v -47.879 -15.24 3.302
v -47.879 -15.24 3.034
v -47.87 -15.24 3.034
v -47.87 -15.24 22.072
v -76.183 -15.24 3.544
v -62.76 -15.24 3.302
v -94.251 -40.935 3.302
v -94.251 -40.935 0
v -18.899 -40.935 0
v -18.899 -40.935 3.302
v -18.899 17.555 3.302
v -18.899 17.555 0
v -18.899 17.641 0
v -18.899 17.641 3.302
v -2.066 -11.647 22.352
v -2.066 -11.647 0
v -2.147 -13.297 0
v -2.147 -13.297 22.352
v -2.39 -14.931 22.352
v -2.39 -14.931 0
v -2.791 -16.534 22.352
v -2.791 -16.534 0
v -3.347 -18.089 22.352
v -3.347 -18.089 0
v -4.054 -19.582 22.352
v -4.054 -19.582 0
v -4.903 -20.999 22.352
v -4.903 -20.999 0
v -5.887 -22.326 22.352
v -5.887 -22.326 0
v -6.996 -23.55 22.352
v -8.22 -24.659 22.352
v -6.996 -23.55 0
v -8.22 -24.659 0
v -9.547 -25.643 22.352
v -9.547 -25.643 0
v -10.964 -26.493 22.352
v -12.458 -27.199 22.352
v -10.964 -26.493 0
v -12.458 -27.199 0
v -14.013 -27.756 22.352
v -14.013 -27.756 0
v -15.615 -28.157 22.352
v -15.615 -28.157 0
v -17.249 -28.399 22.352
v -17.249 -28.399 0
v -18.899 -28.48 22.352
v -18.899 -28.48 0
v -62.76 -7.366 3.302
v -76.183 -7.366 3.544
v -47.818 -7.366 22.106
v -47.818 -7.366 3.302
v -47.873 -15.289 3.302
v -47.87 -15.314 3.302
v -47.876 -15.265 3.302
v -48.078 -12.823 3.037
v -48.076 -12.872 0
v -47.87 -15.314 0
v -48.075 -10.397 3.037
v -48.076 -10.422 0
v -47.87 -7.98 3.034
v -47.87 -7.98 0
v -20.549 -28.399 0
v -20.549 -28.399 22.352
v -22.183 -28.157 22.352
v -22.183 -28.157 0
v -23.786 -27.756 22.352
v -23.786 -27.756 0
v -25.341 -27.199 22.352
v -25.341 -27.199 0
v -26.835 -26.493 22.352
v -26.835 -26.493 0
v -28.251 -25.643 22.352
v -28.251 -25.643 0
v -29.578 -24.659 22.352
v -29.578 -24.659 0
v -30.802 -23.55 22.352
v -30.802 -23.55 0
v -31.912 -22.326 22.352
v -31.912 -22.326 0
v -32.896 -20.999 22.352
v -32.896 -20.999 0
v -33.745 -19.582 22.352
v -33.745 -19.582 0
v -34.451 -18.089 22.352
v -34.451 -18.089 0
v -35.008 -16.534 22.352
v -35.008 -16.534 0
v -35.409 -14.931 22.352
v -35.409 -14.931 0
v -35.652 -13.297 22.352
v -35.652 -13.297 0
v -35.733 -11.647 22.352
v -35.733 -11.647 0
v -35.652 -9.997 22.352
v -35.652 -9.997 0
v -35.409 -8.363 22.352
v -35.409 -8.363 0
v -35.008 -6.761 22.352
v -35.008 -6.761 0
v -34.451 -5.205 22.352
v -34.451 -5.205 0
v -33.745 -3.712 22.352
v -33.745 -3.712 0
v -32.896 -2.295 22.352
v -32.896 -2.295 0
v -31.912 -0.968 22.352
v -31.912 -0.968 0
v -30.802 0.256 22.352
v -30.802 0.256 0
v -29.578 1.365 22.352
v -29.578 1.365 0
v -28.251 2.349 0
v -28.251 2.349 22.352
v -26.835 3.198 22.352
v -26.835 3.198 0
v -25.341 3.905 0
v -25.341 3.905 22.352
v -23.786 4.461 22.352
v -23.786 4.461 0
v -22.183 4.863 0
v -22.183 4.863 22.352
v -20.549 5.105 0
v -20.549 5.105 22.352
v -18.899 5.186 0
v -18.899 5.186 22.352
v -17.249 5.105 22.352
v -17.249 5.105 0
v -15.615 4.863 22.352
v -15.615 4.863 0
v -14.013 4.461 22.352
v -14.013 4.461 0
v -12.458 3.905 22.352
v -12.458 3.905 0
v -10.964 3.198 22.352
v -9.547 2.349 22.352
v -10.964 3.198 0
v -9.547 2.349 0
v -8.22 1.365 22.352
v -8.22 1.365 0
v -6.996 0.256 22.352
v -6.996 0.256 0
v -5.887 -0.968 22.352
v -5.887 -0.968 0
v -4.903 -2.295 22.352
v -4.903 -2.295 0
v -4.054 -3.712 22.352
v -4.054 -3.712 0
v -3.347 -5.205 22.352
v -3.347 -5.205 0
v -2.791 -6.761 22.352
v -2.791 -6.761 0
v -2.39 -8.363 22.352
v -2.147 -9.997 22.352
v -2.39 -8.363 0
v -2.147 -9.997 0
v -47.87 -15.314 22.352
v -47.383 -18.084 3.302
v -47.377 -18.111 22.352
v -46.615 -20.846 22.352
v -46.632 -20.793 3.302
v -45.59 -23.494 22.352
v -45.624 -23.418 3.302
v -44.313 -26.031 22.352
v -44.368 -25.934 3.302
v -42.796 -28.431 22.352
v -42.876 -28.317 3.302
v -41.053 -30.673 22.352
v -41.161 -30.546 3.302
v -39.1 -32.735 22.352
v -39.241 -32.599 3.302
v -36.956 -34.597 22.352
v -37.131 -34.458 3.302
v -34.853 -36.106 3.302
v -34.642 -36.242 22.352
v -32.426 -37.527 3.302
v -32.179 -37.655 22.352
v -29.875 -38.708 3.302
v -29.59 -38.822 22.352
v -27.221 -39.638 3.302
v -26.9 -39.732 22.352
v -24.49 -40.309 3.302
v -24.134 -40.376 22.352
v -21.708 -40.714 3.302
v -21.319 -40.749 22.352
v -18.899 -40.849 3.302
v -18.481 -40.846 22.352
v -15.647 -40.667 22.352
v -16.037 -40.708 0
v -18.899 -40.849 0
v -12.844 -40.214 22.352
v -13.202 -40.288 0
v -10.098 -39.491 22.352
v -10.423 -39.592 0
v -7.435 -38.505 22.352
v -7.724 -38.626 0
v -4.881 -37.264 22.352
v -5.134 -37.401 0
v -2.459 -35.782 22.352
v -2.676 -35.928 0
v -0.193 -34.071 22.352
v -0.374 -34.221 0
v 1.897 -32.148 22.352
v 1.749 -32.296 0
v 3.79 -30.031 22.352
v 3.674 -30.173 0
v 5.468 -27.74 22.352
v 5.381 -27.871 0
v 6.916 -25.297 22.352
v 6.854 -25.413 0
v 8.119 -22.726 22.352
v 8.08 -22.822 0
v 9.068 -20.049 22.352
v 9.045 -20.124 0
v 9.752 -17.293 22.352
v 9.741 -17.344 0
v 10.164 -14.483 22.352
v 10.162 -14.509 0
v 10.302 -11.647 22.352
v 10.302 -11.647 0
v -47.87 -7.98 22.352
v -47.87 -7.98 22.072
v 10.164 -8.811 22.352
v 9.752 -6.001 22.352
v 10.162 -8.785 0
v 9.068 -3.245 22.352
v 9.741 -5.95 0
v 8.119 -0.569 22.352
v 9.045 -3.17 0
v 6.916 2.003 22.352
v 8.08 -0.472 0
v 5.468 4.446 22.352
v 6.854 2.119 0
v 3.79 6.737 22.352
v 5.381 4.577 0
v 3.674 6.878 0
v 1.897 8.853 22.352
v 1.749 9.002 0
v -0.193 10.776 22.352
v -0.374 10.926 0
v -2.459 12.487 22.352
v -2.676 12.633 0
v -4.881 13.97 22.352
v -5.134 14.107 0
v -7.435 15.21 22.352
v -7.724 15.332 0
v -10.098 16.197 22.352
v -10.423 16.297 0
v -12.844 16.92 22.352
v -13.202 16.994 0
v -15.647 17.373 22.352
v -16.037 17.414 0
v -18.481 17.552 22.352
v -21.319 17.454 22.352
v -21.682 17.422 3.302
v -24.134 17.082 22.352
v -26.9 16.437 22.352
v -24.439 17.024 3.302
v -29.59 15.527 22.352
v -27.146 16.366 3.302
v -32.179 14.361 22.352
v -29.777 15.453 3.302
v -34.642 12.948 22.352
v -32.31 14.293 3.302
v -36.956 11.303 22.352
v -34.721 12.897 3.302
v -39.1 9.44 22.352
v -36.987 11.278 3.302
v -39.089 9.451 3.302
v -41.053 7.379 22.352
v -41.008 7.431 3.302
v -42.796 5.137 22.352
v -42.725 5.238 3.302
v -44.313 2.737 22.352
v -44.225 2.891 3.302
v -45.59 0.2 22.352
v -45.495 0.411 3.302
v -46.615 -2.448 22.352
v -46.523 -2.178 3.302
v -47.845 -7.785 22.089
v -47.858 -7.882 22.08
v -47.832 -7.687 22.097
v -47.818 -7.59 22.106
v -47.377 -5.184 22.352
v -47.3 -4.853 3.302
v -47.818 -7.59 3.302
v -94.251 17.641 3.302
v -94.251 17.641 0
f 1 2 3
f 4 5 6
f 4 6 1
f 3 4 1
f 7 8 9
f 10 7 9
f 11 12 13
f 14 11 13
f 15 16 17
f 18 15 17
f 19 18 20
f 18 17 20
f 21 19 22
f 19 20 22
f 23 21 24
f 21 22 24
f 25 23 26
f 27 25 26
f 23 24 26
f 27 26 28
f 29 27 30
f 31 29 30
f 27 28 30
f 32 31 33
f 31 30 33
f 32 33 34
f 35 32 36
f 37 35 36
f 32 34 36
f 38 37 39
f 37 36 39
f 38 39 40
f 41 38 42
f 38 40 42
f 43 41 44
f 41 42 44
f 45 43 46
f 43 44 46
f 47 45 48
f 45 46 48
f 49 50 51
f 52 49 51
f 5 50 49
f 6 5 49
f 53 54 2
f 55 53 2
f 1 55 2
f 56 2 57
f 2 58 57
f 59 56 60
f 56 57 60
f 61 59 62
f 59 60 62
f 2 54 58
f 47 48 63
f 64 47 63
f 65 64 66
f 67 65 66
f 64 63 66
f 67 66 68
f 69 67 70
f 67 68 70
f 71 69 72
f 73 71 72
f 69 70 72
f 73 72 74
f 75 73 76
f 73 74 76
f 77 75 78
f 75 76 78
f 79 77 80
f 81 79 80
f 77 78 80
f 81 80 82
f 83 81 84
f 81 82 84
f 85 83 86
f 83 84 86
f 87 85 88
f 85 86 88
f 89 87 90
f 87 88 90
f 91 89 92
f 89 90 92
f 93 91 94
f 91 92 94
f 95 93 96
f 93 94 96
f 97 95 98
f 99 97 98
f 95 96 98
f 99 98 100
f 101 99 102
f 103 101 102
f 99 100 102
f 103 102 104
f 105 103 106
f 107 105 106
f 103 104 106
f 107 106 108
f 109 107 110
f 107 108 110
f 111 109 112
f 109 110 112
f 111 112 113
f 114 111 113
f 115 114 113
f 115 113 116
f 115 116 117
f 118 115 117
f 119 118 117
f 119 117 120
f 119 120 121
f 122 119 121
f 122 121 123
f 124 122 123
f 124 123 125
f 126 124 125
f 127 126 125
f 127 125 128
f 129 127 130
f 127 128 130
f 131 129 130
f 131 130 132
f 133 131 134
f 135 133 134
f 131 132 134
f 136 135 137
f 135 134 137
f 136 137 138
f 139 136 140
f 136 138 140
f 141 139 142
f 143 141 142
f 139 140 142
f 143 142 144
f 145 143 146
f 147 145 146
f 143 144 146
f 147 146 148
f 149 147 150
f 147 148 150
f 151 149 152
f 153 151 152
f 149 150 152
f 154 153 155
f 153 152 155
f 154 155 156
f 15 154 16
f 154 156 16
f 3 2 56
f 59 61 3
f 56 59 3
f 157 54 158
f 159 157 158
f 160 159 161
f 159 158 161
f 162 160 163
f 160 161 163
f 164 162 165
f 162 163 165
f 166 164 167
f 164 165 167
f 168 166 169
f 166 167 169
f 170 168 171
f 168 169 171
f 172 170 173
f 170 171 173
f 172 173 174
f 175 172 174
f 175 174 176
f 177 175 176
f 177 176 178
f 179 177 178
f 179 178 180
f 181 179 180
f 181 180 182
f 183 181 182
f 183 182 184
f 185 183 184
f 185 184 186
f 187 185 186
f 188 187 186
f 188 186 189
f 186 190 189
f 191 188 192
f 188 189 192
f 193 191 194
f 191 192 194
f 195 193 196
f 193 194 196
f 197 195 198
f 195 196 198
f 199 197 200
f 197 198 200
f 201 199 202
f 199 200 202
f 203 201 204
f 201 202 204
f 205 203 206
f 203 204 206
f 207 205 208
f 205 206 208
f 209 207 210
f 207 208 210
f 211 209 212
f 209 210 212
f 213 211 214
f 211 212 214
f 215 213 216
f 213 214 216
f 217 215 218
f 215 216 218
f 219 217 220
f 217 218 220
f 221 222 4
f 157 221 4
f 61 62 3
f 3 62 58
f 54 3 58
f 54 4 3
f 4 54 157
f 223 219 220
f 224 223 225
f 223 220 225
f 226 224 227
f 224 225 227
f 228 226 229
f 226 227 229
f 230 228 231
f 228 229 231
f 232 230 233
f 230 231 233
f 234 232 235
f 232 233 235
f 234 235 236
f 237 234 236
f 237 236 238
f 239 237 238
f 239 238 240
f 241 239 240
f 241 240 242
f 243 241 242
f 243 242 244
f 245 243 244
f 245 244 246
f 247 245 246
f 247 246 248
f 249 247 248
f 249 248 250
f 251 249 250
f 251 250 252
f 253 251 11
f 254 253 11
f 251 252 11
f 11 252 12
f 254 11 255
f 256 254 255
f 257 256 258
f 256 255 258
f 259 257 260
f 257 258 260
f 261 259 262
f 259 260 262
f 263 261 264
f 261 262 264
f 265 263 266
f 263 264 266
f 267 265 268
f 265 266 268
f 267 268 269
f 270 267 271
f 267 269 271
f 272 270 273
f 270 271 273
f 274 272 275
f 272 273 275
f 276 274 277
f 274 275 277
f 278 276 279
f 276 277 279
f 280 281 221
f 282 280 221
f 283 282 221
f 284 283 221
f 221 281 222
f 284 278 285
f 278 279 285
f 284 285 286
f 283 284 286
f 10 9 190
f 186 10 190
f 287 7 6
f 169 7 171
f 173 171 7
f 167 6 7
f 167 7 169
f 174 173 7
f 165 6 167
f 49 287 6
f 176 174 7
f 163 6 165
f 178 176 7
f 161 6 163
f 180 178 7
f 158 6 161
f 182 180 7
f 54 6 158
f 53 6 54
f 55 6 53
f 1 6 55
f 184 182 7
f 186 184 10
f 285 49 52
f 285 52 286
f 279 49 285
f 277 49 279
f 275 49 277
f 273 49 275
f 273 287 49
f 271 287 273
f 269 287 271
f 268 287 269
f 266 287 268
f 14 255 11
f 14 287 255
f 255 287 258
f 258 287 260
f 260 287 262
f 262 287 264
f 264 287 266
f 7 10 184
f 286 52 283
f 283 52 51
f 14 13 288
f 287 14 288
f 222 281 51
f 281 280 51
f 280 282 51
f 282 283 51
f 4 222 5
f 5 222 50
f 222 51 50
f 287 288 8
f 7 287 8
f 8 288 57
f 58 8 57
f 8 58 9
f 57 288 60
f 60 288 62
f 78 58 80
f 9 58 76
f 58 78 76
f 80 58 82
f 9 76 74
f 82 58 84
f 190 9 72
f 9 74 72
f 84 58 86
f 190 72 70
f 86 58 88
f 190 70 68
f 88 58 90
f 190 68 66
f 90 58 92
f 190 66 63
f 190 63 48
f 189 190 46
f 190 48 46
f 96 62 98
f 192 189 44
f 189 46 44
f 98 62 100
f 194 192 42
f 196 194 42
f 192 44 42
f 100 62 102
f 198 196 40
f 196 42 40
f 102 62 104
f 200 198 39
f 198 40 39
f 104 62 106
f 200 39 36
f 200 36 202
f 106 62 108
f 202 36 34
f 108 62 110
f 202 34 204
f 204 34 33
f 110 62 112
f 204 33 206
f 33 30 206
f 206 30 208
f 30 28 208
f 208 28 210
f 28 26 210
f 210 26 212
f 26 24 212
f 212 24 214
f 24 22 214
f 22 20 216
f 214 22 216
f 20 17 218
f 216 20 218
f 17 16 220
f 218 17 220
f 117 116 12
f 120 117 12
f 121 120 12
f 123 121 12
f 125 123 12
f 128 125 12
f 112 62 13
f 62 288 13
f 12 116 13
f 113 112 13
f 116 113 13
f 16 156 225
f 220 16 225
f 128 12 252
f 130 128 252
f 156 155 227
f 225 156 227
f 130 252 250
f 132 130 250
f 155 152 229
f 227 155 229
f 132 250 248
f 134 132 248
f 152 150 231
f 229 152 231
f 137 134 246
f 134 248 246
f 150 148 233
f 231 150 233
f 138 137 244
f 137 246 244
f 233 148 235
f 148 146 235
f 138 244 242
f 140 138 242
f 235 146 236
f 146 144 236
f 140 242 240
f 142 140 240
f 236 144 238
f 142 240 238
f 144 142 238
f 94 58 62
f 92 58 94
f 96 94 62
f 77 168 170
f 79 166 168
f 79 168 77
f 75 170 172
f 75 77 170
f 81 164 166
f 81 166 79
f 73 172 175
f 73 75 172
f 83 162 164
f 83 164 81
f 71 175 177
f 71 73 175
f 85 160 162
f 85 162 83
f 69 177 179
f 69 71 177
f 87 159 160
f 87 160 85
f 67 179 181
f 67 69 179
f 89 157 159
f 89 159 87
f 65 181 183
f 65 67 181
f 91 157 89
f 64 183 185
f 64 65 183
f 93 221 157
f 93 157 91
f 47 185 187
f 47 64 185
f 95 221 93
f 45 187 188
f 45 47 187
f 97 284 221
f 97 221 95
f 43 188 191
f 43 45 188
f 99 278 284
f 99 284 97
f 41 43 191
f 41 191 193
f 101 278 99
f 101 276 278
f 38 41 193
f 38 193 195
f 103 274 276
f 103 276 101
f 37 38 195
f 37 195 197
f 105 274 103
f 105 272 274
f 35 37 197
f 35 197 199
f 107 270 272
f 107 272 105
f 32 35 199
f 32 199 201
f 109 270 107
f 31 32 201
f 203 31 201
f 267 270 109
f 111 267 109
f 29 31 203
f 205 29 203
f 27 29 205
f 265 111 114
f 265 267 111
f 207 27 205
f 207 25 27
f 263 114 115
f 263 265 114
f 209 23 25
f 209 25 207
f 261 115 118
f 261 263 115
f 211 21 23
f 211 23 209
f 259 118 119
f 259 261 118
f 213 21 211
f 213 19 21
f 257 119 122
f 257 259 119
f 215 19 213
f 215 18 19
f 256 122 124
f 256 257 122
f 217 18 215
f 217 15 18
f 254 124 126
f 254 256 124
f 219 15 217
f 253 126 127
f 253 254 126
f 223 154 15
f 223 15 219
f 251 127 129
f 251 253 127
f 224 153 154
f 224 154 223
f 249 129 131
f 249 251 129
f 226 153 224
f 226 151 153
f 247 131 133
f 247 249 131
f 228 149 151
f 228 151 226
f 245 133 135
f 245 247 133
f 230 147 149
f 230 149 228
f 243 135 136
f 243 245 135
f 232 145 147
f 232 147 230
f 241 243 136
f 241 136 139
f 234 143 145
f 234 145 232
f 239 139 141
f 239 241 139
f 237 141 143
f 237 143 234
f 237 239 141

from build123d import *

# Parameters (mm, degrees)
F1_DEPTH = 22.352
F2_DEPTH = 3.302
F4_DEPTH = 15.24
F5_DEPTH = 7.366


with BuildPart() as f1:
    # F0 (on Top) → F1 (new body)
    with BuildSketch(Plane.XY):
        with BuildLine():
            ThreePointArc((10.3024817516, -11.647160165), (1.7494492179, 9.0016869774), (-18.8993979245, 17.5547195112))
            Line((-18.8993979245, 17.5547195112), (-18.8993979245, 5.1860932686))
            ThreePointArc((-18.8993979245, 5.1860932686), (-6.9964902722, 0.2557474873), (-2.0661444909, -11.647160165))
            ThreePointArc((-2.0661444909, -11.647160165), (-6.9964902722, -23.5500678174), (-18.8993979245, -28.4804135986))
            Line((-18.8993979245, -28.4804135986), (-18.8993979245, -40.8490398412))
            ThreePointArc((-18.8993979245, -40.8490398412), (1.7494492179, -32.2960073074), (10.3024817516, -11.647160165))
        make_face()
        with BuildLine():
            Line((-18.8993979245, 5.1860932686), (-18.8993979245, 17.5547195112))
            ThreePointArc((-18.8993979245, 17.5547195112), (-38.2082616966, 10.2598605465), (-47.8701137319, -7.9800901862))
            Line((-47.8701137319, -7.9800901862), (-47.8701137319, -15.3142301438))
            ThreePointArc((-47.8701137319, -15.3142301438), (-38.2082616966, -33.5541808765), (-18.8993979245, -40.8490398412))
            Line((-18.8993979245, -40.8490398412), (-18.8993979245, -28.4804135986))
            ThreePointArc((-18.8993979245, -28.4804135986), (-35.7326513582, -11.647160165), (-18.8993979245, 5.1860932686))
        make_face()
    extrude(amount=F1_DEPTH)

    # F0 (on Top) → F2 (join)
    with BuildSketch(Plane.XY):
        with BuildLine():
            Line((-18.8993979245, 17.6407303661), (-94.2506045103, 17.6407303661))
            Line((-94.2506045103, 17.6407303661), (-94.2506045103, -40.9350506961))
            Line((-94.2506045103, -40.9350506961), (-18.8993979245, -40.9350506961))
            Line((-18.8993979245, -40.9350506961), (-18.8993979245, -40.8490398412))
            ThreePointArc((-18.8993979245, -40.8490398412), (-38.2082616966, -33.5541808765), (-47.8701137319, -15.3142301438))
            Line((-47.8701137319, -15.3142301438), (-76.080955565, -15.3142301438))
            Line((-76.080955565, -15.3142301438), (-76.080955565, -6.896413397))
            Line((-76.080955565, -6.896413397), (-47.8701137319, -6.896413397))
            Line((-47.8701137319, -6.896413397), (-47.8701137319, -7.9800901862))
            ThreePointArc((-47.8701137319, -7.9800901862), (-38.2082616966, 10.2598605465), (-18.8993979245, 17.5547195112))
            Line((-18.8993979245, 17.5547195112), (-18.8993979245, 17.6407303661))
        make_face()
        with BuildLine():
            ThreePointArc((-47.8701137319, -15.3142301438), (-48.1012776007, -11.647160165), (-47.8701137319, -7.9800901862))
            Line((-47.8701137319, -7.9800901862), (-47.8701137319, -6.896413397))
            Line((-47.8701137319, -6.896413397), (-76.080955565, -6.896413397))
            Line((-76.080955565, -6.896413397), (-76.080955565, -15.3142301438))
            Line((-76.080955565, -15.3142301438), (-47.8701137319, -15.3142301438))
        make_face()
    extrude(amount=F2_DEPTH)

    # F3 (on Front) → F4 (join)
    with BuildSketch(Plane.XZ):
        Polygon((-47.818031162, 22.1061483026), (-76.1827602983, 3.543845145), (-47.818031162, 3.0327689167), align=None)
    extrude(amount=F4_DEPTH)

    # F5 (cut): a face of the model
    f5_faces = [f1.faces().sort_by_distance(p)[0] for p in [
        (-57.3064596084, 0, 9.6084828756),
    ]]
    extrude(f5_faces, amount=-F5_DEPTH, mode=Mode.SUBTRACT)


solid = f1.part
